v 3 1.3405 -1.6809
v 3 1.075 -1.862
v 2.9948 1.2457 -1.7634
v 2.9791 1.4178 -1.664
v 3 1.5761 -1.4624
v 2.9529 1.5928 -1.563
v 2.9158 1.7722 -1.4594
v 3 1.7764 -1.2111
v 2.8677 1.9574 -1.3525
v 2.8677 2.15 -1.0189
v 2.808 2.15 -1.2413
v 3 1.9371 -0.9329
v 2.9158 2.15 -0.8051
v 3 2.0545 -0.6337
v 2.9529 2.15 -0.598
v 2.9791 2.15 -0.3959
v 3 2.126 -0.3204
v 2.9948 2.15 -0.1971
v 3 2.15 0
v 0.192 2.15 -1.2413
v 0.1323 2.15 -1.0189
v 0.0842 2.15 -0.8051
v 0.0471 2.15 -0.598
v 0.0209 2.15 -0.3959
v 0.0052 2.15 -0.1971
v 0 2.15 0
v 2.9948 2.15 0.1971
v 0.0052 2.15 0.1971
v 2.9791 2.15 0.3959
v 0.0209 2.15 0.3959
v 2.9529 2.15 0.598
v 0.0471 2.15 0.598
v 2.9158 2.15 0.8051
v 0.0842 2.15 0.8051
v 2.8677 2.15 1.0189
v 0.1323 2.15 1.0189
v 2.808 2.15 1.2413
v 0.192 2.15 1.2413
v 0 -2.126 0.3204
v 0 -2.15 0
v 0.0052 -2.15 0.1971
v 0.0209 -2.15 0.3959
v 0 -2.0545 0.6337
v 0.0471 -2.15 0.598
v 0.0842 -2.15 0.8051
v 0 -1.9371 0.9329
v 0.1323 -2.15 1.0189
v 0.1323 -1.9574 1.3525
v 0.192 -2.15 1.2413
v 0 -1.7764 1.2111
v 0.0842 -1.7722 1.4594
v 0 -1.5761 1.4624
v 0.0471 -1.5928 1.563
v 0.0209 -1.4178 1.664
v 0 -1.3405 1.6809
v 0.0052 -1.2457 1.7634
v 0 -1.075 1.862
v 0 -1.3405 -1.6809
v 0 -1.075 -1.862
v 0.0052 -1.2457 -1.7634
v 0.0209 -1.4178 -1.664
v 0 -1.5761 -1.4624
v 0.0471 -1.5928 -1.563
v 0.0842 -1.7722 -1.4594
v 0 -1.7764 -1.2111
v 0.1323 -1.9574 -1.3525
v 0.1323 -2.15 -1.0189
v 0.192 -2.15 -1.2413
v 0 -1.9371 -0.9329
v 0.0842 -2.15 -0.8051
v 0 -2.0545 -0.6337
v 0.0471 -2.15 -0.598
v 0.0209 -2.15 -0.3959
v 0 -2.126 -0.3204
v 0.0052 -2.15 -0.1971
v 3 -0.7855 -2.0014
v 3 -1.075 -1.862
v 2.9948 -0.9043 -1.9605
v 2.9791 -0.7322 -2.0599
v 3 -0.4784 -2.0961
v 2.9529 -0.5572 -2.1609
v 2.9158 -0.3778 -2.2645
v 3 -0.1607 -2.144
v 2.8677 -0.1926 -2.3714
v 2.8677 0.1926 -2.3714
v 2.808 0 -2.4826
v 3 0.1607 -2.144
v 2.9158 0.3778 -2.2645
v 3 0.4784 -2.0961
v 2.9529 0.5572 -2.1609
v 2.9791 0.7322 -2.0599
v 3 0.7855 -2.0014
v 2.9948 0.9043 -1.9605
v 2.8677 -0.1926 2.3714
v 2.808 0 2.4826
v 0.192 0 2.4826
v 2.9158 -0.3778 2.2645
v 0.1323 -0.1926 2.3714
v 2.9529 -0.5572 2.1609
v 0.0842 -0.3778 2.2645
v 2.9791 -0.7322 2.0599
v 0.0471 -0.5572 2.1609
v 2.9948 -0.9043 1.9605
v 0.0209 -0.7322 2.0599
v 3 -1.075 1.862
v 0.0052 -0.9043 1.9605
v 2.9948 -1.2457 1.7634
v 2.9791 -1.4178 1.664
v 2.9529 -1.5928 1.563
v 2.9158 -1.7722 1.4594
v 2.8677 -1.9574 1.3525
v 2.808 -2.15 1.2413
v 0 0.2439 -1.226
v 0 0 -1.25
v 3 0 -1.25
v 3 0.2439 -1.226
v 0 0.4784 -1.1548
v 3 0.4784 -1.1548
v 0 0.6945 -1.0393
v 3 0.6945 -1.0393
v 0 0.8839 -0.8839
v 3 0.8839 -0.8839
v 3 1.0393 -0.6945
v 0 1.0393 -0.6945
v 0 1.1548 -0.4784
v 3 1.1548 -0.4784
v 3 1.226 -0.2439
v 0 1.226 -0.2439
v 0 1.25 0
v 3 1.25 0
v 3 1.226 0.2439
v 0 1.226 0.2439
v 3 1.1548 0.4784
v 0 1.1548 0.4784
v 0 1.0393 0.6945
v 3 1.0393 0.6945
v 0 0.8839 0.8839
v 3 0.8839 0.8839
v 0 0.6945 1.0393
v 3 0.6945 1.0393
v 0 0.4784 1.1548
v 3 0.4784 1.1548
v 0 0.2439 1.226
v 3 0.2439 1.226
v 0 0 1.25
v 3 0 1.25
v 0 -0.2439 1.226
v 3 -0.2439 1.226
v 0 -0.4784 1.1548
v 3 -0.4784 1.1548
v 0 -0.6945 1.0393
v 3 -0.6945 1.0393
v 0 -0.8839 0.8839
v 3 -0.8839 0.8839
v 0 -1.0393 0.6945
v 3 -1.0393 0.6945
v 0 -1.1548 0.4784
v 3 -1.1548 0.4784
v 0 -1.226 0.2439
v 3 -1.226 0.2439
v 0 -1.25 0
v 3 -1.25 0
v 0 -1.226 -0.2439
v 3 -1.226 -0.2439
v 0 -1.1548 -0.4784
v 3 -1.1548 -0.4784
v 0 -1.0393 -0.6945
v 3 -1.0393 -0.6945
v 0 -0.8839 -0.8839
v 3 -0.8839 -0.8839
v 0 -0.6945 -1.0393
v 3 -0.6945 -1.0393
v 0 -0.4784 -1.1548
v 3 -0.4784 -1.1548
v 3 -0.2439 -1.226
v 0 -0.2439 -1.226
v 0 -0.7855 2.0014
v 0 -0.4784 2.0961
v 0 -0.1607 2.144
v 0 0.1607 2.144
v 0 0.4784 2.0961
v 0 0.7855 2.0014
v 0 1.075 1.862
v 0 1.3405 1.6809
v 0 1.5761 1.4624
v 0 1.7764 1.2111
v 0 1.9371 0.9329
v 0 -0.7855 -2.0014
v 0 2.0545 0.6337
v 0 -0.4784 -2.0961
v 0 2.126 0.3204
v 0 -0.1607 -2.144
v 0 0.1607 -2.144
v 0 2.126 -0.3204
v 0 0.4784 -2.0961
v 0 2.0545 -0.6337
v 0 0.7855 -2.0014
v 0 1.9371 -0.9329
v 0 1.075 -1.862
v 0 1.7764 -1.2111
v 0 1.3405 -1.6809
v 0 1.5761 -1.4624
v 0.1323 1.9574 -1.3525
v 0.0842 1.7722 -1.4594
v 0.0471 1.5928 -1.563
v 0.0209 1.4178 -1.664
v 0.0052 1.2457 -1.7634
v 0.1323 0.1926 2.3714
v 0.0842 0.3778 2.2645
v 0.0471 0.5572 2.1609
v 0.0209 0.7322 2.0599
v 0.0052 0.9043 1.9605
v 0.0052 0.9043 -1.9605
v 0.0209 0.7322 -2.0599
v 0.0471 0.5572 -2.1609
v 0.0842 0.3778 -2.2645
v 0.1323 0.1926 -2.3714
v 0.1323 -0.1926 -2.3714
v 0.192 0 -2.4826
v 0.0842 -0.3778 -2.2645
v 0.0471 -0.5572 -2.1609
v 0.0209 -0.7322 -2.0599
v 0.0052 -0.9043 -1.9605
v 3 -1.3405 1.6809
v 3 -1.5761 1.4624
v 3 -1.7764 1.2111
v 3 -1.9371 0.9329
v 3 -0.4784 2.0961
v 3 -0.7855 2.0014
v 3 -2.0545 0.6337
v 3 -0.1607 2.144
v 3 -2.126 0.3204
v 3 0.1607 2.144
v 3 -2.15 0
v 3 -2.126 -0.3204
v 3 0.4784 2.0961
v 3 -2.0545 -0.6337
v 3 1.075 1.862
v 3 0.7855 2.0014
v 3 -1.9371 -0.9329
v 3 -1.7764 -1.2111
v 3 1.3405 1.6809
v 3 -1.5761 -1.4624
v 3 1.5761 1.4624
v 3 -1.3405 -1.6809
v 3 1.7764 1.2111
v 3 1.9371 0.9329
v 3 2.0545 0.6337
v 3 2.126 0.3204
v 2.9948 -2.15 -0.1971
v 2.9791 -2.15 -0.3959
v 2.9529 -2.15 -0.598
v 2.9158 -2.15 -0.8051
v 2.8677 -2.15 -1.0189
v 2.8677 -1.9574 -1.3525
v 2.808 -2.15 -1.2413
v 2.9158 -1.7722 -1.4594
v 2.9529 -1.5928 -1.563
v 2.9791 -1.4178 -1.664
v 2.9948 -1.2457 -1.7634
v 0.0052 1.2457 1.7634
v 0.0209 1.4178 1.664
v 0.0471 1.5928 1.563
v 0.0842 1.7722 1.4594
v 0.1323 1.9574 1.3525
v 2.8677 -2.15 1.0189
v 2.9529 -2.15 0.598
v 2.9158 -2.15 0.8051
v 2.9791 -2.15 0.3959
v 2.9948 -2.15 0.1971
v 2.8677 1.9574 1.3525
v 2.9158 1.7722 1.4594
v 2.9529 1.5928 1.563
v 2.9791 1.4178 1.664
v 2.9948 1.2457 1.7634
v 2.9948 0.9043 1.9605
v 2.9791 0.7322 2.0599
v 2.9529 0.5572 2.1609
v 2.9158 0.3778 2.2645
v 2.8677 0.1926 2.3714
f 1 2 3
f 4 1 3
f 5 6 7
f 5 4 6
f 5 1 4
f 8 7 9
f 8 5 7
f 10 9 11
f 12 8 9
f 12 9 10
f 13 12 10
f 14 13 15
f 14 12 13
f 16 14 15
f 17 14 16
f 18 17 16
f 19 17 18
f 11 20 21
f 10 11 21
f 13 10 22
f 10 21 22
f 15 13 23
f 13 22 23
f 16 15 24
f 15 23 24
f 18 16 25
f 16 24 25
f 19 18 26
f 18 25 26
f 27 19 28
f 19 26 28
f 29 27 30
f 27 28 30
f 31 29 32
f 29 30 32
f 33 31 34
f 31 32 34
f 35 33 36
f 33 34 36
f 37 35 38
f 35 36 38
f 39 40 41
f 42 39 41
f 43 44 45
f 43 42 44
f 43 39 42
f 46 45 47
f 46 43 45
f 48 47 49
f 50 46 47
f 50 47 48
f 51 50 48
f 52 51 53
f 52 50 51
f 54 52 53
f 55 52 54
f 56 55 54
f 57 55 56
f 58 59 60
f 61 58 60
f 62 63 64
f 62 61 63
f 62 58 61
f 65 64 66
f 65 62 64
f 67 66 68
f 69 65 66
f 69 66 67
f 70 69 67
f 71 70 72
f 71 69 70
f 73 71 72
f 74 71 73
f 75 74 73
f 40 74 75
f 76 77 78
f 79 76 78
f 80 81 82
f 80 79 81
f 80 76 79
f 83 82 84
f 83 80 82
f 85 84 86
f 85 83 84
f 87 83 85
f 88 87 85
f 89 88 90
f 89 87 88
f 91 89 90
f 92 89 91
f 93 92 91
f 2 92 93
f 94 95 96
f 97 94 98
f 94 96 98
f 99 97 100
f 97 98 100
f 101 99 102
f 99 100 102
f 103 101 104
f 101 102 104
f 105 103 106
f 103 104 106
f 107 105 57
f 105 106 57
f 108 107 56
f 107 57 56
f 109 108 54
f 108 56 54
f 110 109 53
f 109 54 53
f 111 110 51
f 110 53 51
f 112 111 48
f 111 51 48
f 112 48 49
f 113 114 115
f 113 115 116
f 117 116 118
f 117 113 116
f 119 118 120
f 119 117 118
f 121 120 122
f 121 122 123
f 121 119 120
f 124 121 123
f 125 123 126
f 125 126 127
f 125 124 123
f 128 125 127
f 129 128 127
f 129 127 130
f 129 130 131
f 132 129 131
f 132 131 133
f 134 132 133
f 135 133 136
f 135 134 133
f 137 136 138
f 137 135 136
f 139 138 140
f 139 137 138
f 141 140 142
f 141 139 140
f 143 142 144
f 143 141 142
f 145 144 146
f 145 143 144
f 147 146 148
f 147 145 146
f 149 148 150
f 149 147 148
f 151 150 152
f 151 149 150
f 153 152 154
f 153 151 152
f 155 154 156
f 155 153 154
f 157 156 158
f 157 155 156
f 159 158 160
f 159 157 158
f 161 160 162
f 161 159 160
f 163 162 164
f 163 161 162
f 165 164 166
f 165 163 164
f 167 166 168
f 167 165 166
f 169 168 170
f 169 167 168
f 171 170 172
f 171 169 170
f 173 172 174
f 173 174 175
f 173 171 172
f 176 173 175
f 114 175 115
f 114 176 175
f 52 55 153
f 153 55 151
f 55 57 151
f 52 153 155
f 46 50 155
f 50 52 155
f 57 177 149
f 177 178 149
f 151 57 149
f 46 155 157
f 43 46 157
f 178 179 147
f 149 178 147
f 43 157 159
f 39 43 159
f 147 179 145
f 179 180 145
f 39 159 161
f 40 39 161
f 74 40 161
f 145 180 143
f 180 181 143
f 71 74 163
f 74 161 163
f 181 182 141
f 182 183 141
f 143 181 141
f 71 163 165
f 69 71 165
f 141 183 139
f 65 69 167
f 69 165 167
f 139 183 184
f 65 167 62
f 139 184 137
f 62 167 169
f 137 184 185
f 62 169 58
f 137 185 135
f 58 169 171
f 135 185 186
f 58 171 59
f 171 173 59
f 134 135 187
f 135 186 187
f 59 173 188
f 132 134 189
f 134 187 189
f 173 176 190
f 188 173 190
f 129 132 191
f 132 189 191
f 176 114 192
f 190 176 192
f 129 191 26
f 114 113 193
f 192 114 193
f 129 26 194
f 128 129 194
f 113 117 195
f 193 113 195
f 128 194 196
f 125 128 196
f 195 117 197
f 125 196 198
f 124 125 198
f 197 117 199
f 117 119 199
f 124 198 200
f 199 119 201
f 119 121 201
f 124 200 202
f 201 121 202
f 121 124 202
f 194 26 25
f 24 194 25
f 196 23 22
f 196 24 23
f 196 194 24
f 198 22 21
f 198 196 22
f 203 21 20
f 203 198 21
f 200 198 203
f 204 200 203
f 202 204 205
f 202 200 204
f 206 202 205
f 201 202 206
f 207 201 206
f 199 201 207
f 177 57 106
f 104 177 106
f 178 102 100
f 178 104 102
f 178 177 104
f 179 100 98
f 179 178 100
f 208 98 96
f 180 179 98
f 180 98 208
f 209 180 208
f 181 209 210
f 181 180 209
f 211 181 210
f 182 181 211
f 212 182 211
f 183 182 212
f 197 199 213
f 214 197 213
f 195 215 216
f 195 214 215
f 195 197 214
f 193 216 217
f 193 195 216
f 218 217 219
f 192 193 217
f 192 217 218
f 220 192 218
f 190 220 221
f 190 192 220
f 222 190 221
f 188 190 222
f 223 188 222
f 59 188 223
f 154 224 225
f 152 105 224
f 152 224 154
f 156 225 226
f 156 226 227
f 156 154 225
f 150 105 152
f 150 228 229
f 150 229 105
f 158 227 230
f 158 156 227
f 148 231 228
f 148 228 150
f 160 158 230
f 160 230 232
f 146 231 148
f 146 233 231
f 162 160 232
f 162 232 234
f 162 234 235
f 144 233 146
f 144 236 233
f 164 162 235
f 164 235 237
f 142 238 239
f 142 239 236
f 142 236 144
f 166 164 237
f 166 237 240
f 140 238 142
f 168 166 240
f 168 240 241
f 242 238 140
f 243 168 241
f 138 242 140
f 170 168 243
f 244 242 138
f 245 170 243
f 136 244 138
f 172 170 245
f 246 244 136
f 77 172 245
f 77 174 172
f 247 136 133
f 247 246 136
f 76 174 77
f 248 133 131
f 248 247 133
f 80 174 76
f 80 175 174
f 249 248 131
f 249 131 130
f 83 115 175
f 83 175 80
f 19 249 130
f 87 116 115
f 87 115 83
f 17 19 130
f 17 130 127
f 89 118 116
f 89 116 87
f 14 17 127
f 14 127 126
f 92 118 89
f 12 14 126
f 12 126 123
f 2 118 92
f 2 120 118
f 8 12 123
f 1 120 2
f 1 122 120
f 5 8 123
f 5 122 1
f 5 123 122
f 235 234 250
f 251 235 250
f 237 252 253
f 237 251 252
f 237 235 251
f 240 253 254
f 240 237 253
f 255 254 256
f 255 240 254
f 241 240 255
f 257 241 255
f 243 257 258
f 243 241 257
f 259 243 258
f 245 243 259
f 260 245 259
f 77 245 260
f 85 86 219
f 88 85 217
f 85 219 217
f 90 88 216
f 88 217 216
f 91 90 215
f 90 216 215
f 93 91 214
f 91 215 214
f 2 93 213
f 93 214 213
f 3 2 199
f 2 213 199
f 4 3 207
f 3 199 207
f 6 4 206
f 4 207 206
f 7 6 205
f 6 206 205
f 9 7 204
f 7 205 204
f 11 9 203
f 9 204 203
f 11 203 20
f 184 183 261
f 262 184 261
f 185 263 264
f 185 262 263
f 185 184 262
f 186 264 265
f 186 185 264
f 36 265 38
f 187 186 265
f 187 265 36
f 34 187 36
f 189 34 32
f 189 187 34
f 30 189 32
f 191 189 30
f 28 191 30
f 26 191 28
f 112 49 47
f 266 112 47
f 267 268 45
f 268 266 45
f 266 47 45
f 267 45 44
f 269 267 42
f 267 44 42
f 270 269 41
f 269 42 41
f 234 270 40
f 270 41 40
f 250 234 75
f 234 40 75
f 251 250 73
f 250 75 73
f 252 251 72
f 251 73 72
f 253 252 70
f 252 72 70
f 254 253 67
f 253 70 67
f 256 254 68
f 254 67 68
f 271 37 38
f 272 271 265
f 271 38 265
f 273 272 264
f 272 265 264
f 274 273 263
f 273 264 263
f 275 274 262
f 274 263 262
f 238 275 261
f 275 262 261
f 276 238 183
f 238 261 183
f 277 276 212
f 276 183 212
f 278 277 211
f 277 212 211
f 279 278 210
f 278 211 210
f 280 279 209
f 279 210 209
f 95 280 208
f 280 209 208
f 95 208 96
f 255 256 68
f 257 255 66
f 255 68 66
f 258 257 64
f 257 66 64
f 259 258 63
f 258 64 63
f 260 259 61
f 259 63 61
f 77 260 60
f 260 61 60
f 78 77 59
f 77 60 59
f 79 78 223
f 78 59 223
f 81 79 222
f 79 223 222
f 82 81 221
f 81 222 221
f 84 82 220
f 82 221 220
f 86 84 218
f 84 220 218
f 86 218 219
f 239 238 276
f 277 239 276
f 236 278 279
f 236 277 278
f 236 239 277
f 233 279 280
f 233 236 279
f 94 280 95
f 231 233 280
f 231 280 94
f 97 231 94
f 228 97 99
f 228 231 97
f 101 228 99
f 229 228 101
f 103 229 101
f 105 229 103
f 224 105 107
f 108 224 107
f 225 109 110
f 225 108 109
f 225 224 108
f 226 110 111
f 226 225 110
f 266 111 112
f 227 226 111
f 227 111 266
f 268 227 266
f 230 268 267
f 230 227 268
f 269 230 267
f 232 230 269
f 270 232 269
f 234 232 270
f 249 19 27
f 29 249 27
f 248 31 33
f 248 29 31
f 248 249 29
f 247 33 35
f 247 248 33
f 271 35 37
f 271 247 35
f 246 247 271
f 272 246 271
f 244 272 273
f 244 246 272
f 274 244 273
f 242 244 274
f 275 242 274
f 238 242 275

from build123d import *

# Parameters (mm, degrees)
IZIM1_R                     = 1.25
Y_KSEKLIK_EKSTR_ZYON1_DEPTH = 3
IZIM2_OUTSIDE_W             = 43.052
IZIM2_OUTSIDE_H             = 42.386
IZIM2_OUTSIDE_R             = 2.15
KES_EKSTR_ZYON1_DEPTH       = 10
KES_EKSTR_ZYON1_DRAFT       = -60
IZIM3_OUTSIDE_W             = 43.052
IZIM3_OUTSIDE_H             = 42.386
IZIM3_OUTSIDE_R             = 2.15
KES_EKSTR_ZYON2_DEPTH       = 10
KES_EKSTR_ZYON2_DRAFT       = -60


with BuildPart() as part:
    # Çizim1 → Yükseklik-Ekstrüzyon1 (new body)
    with BuildSketch(Plane(origin=(0, 0, 0), x_dir=(0, 0, -1), z_dir=(1, 0, 0))):
        Polygon((2.482606158, 0), (1.241303079, 2.15), (-1.241303079, 2.15), (-2.482606158, 0), (-1.241303079, -2.15), (1.241303079, -2.15), align=None)
        Circle(IZIM1_R, mode=Mode.SUBTRACT)
    extrude(amount=Y_KSEKLIK_EKSTR_ZYON1_DEPTH)


with BuildPart() as kes_ekstr_zyon1_tool:
    # Çizim2 outside → Kes-Ekstrüzyon1 (with draft: the straight prism first)
    with BuildSketch(Plane(origin=(3, 0, 0), x_dir=(0, 0, -1), z_dir=(1, 0, 0))):
        Rectangle(IZIM2_OUTSIDE_W, IZIM2_OUTSIDE_H)
        Circle(IZIM2_OUTSIDE_R, mode=Mode.SUBTRACT)
    extrude(amount=-KES_EKSTR_ZYON1_DEPTH)
    # Kes-Ekstrüzyon1: the draft: its side faces are tilted about the plane it starts from
    kes_ekstr_zyon1_sides = [kes_ekstr_zyon1_tool.faces().sort_by_distance(p)[0] for p in [
        (-2, -21.193, 0),
        (-2, 0, -21.526),
        (-2, 21.193, 0),
        (-2, 0, 21.526),
        (-2, 0, 2.15),
    ]]
    draft(kes_ekstr_zyon1_sides, Plane(origin=(3, 0, 0), x_dir=(0, 0, -1), z_dir=(1, 0, 0)), KES_EKSTR_ZYON1_DRAFT)


with BuildPart() as part_1:
    add(part.part)

    # Kes-Ekstrüzyon1: cut by kes_ekstr_zyon1_tool
    add(kes_ekstr_zyon1_tool.part, mode=Mode.SUBTRACT)


with BuildPart() as kes_ekstr_zyon2_tool:
    # Çizim3 outside → Kes-Ekstrüzyon2 (with draft: the straight prism first)
    with BuildSketch(Plane.ZY):
        Rectangle(IZIM3_OUTSIDE_W, IZIM3_OUTSIDE_H)
        Circle(IZIM3_OUTSIDE_R, mode=Mode.SUBTRACT)
    extrude(amount=-KES_EKSTR_ZYON2_DEPTH)
    # Kes-Ekstrüzyon2: the draft: its side faces are tilted about the plane it starts from
    kes_ekstr_zyon2_sides = [kes_ekstr_zyon2_tool.faces().sort_by_distance(p)[0] for p in [
        (5, -21.193, 0),
        (5, 0, 21.526),
        (5, 21.193, 0),
        (5, 0, -21.526),
        (5, 0, -2.15),
    ]]
    draft(kes_ekstr_zyon2_sides, Plane.ZY, KES_EKSTR_ZYON2_DRAFT)


with BuildPart() as part_2:
    add(part_1.part)

    # Kes-Ekstrüzyon2: cut by kes_ekstr_zyon2_tool
    add(kes_ekstr_zyon2_tool.part, mode=Mode.SUBTRACT)


solid = part_2.part
